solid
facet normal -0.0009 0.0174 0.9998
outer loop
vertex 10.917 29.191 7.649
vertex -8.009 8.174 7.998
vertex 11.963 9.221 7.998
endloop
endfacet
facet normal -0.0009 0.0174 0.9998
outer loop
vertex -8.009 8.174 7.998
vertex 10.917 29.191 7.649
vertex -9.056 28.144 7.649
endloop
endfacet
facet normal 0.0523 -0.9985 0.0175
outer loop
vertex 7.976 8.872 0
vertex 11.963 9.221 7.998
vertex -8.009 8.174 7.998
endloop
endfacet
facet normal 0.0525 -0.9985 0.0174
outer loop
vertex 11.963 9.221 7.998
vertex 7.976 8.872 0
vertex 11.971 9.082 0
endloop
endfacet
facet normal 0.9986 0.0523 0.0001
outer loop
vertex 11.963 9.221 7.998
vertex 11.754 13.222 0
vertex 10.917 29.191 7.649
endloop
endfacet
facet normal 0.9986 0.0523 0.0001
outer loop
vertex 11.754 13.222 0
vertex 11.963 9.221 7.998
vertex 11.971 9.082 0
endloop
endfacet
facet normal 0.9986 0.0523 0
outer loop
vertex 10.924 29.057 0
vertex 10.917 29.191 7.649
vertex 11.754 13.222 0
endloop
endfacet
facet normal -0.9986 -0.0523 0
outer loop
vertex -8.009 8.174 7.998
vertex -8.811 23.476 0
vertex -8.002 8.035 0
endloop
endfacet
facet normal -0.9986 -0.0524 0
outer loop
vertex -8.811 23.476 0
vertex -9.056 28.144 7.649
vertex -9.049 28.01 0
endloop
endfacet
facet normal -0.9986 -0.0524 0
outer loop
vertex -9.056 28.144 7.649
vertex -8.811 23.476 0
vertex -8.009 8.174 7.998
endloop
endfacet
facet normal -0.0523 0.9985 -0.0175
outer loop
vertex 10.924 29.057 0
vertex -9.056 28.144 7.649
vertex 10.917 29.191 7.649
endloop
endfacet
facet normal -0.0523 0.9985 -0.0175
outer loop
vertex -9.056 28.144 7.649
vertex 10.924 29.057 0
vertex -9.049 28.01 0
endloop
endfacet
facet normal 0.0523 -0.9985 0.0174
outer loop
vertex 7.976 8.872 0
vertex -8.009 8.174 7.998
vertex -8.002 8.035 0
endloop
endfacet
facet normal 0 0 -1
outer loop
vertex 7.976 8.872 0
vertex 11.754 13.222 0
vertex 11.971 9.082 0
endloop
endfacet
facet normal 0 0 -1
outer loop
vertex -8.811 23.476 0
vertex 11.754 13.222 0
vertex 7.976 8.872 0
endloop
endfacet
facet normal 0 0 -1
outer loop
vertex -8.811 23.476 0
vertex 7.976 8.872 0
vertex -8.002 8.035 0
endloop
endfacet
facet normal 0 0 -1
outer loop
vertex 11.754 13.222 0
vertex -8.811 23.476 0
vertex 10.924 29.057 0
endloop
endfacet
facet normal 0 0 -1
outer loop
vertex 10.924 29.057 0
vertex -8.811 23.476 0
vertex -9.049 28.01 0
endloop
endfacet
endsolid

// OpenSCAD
difference(){
translate([-8,8,-2])rotate([-1,0,3])cube([20,20,10]);
translate([-20,0,-50])cube(50);
}
